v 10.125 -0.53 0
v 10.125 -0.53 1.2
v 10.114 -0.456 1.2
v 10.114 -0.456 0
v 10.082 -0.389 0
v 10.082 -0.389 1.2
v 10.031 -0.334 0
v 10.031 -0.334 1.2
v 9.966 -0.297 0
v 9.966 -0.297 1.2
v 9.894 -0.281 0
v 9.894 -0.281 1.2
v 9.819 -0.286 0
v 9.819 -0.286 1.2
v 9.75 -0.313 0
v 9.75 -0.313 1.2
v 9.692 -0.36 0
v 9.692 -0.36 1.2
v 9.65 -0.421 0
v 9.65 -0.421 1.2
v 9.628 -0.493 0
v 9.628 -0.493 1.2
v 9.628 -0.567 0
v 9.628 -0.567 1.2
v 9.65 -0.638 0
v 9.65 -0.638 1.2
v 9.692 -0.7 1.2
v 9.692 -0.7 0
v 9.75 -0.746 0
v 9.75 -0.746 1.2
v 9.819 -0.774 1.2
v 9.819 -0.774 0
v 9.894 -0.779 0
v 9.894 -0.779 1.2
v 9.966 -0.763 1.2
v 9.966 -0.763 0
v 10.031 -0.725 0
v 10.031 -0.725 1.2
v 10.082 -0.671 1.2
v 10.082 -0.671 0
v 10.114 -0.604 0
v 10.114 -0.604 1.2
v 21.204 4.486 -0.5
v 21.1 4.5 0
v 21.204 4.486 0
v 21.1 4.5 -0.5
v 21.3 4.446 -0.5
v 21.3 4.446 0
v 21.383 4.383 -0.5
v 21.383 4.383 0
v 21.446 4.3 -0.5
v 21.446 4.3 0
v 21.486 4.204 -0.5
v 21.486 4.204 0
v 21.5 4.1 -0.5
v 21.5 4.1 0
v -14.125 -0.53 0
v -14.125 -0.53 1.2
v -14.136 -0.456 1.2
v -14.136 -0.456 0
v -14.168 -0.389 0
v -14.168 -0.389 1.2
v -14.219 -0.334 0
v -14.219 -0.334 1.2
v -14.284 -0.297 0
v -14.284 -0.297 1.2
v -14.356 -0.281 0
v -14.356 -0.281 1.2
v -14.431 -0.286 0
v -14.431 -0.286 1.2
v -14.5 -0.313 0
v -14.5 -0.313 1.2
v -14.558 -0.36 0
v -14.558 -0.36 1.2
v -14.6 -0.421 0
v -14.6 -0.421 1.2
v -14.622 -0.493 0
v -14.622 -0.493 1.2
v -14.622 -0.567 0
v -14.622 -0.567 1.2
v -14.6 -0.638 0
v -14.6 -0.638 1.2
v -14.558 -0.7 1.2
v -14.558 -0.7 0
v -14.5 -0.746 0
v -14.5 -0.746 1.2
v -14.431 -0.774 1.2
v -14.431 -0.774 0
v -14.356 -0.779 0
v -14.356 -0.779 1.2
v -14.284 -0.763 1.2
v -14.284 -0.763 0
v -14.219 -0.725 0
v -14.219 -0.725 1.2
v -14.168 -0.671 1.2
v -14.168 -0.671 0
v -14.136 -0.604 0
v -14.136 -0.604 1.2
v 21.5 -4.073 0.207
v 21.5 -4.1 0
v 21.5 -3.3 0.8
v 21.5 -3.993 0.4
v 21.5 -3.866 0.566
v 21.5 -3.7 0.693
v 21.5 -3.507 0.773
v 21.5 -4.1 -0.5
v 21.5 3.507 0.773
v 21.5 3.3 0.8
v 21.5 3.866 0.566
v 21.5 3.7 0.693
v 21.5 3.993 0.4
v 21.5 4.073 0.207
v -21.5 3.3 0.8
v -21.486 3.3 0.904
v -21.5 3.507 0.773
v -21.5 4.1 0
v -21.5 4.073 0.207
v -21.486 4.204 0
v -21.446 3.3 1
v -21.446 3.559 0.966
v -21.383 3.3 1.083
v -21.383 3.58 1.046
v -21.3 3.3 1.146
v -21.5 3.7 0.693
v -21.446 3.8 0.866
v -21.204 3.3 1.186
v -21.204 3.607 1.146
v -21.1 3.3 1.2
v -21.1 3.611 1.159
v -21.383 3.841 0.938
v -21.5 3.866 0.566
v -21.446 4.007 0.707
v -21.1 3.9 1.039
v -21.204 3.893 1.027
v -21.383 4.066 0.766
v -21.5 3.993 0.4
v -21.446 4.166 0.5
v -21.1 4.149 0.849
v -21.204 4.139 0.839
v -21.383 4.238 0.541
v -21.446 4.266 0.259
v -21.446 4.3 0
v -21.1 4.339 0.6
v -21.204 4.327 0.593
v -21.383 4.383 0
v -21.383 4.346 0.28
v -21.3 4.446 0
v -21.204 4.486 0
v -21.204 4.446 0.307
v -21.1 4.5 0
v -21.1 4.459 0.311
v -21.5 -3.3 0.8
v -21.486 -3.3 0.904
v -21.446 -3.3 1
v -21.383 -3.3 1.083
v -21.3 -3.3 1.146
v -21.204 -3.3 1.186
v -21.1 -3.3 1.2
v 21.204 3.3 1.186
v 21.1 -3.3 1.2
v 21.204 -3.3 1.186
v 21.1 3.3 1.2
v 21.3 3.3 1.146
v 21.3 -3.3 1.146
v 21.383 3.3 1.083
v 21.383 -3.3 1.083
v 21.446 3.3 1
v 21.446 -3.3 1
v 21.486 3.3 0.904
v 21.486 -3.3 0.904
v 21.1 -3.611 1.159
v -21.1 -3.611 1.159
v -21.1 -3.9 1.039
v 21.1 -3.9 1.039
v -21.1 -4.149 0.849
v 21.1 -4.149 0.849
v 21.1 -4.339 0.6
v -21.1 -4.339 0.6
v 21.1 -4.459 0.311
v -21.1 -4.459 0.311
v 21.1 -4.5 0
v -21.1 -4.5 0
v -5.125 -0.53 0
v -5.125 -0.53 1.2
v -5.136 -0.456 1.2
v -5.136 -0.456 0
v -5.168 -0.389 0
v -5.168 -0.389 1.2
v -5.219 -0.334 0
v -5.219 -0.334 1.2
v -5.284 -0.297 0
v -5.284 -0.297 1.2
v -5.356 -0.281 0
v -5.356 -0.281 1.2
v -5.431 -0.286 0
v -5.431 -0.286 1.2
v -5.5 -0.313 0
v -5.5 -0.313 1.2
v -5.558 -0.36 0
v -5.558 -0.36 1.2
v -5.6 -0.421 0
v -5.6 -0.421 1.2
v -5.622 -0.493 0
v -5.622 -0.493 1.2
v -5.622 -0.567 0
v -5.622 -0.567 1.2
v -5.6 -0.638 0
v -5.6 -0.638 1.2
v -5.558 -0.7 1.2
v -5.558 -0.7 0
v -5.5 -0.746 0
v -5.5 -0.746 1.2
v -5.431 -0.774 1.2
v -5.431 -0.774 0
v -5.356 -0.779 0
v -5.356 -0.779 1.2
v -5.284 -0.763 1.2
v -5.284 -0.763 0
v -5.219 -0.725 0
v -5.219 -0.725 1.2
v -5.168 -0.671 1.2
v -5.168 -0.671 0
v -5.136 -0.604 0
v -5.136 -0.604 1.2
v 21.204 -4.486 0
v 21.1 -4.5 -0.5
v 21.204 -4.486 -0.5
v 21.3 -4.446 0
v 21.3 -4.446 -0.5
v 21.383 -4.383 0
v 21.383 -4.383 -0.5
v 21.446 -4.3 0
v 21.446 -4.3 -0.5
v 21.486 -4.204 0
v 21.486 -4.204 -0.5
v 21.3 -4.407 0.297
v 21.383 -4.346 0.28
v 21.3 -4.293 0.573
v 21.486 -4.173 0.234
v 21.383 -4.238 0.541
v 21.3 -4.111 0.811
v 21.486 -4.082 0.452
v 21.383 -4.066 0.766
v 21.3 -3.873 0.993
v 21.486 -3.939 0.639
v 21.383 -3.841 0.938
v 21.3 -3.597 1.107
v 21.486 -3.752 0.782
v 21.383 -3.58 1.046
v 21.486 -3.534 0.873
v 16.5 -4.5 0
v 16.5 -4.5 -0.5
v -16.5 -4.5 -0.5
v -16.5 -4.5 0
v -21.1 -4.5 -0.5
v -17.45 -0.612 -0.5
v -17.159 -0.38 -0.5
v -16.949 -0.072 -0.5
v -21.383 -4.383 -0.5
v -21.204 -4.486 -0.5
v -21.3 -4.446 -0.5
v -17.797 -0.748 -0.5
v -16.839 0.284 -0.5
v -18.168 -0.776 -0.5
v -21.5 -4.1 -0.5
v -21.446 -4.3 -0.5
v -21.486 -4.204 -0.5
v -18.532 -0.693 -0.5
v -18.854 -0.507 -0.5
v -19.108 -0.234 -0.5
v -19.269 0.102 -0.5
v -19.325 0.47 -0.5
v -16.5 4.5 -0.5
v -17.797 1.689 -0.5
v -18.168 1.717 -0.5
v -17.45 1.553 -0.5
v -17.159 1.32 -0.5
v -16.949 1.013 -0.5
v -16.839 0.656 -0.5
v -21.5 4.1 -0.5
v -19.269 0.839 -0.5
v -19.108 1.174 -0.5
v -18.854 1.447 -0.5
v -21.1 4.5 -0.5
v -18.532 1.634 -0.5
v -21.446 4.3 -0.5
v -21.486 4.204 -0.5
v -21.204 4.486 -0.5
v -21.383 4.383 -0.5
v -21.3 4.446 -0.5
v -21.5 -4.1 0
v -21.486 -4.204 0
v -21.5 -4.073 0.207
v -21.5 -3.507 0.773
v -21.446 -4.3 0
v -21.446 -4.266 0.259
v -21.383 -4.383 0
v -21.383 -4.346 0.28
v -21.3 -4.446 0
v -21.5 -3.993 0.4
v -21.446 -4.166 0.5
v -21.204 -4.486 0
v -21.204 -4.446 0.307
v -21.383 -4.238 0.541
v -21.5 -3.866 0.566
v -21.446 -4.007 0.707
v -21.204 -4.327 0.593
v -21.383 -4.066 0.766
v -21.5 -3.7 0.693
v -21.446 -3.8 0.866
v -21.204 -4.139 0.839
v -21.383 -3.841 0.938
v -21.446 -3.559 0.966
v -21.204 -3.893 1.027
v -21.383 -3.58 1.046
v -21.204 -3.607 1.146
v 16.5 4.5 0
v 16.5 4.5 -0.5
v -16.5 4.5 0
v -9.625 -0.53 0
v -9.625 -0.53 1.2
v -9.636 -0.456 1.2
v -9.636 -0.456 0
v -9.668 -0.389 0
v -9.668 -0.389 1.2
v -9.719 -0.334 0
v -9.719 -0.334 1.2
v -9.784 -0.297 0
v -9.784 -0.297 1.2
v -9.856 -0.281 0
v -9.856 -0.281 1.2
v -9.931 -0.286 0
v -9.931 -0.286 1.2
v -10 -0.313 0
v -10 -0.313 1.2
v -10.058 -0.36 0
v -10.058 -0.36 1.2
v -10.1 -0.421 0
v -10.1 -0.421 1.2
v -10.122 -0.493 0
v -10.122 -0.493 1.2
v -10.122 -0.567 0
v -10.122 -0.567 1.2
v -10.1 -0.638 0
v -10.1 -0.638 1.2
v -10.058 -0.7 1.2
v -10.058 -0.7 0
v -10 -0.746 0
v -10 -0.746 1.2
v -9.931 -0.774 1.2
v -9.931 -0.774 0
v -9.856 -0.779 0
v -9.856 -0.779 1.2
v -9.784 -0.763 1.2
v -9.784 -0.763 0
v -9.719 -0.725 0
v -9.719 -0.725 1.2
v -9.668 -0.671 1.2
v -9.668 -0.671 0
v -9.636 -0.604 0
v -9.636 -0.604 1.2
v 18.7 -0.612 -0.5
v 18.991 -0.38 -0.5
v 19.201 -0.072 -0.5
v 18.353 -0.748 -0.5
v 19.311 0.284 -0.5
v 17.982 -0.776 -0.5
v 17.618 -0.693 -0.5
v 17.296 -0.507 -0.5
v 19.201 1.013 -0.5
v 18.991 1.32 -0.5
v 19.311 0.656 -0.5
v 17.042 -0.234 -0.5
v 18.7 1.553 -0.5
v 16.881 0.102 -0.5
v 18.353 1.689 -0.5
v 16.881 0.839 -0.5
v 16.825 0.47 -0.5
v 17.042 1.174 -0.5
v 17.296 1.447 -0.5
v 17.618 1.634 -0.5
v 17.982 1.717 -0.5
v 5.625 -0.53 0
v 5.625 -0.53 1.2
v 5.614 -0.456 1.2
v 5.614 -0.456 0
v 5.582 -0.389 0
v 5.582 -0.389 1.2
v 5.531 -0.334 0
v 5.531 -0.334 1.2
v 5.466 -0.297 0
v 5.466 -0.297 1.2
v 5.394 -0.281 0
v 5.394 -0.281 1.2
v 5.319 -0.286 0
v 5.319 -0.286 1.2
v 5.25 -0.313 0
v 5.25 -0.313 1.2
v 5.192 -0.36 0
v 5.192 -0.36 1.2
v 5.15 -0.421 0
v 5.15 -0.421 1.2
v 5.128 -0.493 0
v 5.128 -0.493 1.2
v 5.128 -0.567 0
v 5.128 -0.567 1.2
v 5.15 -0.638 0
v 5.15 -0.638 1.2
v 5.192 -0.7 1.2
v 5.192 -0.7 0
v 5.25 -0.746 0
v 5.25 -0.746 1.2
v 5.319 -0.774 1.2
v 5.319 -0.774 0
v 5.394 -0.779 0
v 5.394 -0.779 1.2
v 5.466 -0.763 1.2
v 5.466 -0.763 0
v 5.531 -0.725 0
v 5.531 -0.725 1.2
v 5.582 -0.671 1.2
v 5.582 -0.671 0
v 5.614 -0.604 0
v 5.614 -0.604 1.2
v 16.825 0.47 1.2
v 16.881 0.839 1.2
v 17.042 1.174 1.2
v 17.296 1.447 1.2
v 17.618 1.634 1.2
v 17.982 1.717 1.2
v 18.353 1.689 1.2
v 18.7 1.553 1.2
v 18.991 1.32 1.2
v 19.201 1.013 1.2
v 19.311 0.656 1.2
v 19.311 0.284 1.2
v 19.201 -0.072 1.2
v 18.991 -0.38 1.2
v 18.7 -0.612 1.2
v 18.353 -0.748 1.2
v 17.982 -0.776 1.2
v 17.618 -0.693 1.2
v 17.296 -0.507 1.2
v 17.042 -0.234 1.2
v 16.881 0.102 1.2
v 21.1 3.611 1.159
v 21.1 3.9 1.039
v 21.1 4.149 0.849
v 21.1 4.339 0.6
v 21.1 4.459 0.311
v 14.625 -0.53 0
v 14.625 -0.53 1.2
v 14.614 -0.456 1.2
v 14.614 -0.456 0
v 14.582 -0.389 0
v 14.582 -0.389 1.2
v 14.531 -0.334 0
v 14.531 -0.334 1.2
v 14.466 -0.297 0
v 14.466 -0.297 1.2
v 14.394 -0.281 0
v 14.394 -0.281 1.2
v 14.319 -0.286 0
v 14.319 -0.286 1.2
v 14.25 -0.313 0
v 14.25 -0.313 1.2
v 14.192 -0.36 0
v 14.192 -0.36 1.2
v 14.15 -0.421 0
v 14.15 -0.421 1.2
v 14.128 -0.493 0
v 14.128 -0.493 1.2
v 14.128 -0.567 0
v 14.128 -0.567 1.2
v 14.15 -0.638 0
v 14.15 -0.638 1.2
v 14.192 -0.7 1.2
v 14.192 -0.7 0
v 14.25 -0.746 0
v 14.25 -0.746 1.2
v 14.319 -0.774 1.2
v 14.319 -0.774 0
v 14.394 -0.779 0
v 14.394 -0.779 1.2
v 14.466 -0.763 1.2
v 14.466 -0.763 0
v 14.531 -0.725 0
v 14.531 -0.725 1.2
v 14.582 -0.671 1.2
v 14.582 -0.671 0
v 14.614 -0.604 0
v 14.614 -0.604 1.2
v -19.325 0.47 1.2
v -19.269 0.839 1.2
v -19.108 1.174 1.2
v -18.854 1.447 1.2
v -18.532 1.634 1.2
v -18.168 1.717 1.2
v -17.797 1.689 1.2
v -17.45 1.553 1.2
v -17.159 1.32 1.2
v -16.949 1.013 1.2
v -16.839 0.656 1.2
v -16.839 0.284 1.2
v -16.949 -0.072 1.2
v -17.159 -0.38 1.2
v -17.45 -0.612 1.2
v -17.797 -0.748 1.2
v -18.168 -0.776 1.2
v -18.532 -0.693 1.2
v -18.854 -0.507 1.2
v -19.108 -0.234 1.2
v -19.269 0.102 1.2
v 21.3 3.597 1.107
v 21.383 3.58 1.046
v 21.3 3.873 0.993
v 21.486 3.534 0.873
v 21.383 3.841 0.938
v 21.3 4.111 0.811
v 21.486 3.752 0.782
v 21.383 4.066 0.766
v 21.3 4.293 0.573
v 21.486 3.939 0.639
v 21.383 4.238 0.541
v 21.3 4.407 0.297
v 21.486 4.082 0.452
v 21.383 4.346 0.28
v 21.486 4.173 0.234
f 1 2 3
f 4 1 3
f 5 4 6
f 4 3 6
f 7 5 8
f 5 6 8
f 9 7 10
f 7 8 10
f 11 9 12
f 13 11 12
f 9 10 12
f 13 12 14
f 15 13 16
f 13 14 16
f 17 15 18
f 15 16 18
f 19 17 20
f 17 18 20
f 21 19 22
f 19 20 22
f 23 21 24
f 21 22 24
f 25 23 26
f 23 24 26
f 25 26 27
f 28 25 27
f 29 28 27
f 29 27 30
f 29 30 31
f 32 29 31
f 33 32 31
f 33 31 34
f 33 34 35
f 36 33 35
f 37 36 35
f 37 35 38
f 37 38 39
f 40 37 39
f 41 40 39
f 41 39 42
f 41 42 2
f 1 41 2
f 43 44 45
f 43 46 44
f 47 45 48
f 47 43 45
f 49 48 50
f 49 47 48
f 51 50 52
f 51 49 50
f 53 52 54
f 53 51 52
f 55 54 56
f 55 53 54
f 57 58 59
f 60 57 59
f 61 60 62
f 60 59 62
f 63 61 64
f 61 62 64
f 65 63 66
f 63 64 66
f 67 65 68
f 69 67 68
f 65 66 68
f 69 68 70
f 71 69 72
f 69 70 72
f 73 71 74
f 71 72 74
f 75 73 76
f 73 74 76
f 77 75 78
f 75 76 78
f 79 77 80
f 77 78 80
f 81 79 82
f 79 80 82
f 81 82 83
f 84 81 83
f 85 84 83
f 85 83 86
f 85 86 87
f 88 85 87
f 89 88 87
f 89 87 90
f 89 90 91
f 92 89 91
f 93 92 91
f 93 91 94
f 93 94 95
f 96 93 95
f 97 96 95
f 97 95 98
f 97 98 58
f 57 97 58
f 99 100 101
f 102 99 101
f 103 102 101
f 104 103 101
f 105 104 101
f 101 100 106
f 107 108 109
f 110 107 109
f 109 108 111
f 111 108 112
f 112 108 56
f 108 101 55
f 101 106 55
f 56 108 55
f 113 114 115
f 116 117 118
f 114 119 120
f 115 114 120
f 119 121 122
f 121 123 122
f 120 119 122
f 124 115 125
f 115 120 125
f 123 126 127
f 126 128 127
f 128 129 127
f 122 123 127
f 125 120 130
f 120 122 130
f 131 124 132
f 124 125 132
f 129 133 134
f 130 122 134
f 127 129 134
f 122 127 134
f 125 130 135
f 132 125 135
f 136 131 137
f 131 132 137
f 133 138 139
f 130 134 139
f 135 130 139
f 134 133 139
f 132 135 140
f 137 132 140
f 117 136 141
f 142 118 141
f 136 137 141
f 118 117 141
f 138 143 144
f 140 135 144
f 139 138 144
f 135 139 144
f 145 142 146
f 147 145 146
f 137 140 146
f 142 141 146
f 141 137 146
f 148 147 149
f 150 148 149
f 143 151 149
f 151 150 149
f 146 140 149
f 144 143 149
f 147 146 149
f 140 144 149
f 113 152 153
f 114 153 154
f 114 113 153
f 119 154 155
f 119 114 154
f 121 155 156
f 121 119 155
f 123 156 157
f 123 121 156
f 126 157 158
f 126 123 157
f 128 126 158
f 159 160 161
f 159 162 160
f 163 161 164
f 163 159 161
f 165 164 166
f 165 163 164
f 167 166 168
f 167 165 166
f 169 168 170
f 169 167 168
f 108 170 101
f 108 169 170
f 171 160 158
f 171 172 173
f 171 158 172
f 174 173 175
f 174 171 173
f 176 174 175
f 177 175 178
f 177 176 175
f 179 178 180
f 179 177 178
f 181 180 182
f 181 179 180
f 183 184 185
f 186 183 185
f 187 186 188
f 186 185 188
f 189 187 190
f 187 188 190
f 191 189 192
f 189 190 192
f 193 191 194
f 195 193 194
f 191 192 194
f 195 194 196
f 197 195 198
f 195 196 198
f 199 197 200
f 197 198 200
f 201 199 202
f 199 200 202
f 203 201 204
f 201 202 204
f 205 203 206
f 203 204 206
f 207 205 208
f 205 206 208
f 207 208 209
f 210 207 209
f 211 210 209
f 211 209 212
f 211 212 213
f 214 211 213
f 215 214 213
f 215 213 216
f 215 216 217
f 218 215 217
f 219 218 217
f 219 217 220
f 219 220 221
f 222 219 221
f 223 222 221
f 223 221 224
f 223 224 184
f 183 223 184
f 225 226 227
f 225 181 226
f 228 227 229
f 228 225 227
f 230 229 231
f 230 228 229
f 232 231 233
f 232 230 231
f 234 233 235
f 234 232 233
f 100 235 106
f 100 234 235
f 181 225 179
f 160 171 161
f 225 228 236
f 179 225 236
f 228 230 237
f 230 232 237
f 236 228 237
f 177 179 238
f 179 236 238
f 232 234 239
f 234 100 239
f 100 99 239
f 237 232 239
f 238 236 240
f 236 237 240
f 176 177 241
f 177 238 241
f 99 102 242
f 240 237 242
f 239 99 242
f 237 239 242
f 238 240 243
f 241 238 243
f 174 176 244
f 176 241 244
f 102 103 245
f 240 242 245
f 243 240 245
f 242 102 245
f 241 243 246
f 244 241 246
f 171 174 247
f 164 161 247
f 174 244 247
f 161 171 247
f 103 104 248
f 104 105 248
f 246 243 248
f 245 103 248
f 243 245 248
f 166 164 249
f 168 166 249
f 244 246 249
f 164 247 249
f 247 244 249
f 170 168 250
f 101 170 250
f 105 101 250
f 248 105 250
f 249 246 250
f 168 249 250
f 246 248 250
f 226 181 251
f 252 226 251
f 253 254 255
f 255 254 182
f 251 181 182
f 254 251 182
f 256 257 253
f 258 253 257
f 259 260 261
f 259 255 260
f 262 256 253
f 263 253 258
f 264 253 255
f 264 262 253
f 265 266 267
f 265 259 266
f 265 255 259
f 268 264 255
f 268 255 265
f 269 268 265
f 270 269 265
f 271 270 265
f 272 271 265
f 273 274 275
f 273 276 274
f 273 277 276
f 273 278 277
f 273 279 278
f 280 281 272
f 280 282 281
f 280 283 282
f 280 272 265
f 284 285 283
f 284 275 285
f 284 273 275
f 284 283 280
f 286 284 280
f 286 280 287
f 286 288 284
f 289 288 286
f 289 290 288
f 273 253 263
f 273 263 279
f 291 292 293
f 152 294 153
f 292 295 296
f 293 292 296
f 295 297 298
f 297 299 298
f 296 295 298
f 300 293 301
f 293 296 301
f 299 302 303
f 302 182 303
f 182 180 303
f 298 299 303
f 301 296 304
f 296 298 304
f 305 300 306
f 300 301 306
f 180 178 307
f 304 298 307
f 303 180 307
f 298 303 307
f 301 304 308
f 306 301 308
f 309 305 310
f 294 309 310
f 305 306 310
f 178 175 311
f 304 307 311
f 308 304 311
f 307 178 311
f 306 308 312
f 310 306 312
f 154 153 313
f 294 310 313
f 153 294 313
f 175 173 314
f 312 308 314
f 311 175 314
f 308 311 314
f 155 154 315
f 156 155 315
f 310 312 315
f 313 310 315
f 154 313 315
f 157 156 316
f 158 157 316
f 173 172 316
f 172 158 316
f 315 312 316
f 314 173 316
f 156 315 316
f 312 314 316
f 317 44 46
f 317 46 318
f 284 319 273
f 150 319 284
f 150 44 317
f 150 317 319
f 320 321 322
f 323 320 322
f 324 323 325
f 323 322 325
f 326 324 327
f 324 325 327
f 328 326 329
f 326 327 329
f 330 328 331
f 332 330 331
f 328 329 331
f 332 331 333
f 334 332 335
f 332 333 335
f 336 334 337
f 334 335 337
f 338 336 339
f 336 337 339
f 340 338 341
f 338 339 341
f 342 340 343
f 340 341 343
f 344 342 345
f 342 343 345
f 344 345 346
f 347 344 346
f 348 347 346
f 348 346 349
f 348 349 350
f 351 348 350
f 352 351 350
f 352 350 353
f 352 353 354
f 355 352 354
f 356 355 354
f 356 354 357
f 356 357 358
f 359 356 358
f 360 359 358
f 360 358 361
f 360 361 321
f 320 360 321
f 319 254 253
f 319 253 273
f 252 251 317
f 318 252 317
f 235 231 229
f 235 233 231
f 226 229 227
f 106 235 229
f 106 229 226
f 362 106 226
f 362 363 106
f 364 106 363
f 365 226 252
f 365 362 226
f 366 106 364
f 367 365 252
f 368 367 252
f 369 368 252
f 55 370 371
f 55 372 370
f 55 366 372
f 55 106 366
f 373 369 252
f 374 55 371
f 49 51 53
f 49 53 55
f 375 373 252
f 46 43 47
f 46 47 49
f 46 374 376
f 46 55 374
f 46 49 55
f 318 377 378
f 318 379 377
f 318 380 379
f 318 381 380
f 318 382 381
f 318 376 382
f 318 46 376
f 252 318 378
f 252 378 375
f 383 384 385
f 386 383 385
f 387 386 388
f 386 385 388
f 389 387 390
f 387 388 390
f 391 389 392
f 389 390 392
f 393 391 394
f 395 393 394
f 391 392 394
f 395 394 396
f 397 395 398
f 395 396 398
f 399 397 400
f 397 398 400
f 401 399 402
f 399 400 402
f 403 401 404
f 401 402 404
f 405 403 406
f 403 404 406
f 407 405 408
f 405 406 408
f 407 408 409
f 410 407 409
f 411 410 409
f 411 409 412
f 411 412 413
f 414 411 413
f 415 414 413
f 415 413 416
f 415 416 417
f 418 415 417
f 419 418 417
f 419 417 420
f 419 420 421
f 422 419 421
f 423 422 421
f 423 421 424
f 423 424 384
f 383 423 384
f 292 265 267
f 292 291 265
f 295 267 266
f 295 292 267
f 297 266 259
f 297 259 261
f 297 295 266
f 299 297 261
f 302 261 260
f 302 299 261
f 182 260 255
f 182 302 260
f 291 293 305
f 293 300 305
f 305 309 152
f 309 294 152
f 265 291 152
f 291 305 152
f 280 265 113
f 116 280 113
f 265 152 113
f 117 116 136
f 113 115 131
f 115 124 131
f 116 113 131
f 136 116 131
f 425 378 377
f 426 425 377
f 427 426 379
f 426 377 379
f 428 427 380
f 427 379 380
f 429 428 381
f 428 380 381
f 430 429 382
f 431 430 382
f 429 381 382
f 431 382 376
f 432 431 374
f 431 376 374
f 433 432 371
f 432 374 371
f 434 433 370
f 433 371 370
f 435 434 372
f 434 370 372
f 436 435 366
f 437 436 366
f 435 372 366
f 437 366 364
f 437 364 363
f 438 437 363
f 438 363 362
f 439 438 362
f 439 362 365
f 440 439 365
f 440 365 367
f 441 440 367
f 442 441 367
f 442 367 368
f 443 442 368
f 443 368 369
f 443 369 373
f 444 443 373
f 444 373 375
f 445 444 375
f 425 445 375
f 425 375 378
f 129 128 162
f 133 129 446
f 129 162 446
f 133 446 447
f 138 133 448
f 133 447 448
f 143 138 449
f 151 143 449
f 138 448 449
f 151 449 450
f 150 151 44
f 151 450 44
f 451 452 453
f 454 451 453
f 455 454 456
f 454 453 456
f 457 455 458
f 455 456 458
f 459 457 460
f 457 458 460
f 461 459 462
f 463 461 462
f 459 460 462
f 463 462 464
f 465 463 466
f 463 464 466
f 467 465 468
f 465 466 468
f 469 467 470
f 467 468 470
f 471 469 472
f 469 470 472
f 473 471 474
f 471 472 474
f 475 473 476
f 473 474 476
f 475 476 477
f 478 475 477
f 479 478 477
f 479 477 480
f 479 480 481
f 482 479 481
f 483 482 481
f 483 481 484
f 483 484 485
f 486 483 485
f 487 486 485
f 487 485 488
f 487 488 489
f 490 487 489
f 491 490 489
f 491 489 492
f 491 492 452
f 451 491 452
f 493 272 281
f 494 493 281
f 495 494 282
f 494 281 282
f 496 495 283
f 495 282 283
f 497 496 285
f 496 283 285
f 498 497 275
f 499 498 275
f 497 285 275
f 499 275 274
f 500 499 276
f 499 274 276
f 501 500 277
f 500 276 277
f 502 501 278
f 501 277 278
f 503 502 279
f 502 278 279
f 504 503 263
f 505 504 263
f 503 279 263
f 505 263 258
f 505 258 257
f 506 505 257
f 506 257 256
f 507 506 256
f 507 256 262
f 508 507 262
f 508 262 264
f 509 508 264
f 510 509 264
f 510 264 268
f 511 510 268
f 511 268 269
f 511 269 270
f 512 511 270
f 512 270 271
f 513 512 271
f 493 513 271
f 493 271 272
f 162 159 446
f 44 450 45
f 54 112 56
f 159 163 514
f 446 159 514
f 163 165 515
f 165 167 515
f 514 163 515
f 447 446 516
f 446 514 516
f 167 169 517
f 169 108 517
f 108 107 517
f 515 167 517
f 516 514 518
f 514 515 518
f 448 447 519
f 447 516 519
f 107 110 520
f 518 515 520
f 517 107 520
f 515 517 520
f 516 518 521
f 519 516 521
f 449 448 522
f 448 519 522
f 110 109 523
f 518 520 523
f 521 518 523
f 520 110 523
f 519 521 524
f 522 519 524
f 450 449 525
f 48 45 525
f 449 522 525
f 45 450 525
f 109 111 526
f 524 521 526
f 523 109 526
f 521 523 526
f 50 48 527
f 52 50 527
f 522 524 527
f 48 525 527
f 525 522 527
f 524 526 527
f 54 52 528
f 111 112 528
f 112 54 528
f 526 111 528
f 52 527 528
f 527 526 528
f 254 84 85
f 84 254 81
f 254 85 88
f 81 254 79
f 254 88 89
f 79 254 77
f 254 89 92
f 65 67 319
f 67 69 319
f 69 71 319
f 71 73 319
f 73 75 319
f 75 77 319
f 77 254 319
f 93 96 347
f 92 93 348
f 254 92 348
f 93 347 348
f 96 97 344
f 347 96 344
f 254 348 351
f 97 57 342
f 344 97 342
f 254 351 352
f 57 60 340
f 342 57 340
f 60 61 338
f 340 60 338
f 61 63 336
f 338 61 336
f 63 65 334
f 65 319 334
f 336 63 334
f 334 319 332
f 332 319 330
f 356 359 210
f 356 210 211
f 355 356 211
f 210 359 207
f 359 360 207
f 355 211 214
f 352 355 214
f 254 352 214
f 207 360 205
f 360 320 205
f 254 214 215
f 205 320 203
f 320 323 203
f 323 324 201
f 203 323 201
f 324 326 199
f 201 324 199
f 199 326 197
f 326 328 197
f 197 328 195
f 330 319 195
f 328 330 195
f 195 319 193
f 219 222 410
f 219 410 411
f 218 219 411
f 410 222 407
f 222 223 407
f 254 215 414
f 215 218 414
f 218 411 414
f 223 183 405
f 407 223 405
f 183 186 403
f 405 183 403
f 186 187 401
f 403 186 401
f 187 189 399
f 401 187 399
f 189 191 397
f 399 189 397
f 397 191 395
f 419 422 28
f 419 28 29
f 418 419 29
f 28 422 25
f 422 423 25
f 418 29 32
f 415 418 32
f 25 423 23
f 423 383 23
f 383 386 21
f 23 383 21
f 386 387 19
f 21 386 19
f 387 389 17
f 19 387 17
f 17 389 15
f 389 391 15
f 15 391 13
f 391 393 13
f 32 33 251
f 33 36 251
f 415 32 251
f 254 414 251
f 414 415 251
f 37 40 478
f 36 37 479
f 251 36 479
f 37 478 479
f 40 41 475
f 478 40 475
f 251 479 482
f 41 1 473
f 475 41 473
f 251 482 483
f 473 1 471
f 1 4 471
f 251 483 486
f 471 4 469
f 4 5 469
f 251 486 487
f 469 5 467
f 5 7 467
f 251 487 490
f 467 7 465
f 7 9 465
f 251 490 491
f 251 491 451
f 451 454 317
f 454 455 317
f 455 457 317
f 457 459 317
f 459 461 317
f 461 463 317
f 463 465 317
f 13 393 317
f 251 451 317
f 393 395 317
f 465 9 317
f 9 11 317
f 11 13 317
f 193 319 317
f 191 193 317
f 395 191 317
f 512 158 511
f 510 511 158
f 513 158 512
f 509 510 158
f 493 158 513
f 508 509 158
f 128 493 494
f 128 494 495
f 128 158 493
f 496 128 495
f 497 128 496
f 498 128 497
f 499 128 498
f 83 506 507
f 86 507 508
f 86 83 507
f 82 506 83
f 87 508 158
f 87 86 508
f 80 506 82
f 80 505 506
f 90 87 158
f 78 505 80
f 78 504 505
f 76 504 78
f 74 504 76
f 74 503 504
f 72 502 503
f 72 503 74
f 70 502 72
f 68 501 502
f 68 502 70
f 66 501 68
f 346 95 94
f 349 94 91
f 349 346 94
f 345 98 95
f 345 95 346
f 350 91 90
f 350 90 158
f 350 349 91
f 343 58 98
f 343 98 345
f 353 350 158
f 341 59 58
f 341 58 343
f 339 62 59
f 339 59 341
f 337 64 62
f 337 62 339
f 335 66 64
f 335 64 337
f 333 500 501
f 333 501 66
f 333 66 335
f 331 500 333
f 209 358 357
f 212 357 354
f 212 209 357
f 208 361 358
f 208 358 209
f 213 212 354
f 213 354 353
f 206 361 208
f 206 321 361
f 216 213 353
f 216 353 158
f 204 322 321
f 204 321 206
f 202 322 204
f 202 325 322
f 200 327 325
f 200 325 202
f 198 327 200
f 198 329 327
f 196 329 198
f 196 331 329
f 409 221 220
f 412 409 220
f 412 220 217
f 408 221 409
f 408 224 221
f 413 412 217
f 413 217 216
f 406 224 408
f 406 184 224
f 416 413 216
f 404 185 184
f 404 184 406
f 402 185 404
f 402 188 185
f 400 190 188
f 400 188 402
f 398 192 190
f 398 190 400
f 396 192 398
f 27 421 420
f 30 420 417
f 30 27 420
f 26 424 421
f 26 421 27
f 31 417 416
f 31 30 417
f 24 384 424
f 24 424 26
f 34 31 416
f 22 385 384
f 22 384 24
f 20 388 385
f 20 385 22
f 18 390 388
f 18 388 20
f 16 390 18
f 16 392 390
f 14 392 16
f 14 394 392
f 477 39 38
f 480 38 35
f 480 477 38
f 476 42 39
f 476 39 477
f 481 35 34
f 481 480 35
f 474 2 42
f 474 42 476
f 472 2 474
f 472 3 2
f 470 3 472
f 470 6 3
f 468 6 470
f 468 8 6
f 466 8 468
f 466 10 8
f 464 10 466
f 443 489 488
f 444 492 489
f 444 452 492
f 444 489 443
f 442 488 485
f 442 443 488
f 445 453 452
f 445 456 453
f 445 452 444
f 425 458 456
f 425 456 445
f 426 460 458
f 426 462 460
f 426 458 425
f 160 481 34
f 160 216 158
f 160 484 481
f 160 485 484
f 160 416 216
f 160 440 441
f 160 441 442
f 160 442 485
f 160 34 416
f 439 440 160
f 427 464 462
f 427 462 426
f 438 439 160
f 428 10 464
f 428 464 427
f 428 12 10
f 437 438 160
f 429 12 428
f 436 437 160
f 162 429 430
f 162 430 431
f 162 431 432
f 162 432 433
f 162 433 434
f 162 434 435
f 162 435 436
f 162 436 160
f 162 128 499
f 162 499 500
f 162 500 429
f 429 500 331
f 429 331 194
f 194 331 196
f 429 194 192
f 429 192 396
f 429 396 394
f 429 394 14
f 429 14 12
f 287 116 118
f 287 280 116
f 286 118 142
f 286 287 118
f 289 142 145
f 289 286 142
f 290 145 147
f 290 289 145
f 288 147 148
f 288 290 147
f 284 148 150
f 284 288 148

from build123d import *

# Parameters (mm, degrees)
ESBO_O1_W                = 43
ESBO_O1_H                = 9
RESSALTO_EXTRUS_O1_DEPTH = 1.2
ESBO_O4_W                = 5
ESBO_O4_H                = 9
RESSALTO_EXTRUS_O4_DEPTH = 0.5
FILETE1_R                = 1.2
FILETE2_R                = 1.2
ESBO_O6_R                = 1.25
CORTE_EXTRUS_O2_DEPTH    = 5.5
FILETE3_R                = 0.4
FILETE4_R                = 0.4
ESBO_O7_R                = 0.25
CORTE_EXTRUS_O3_DEPTH    = 23.031568281


with BuildPart() as part:
    # Esboço1 → Ressalto-extrusão1 (new body)
    with BuildSketch(Plane.XY):
        Rectangle(ESBO_O1_W, ESBO_O1_H)
    extrude(amount=RESSALTO_EXTRUS_O1_DEPTH)

    # Esboço4 → Ressalto-extrusão4 (add)
    with BuildSketch(Plane(origin=(0, 0, 0), x_dir=(-1, 0, 0), z_dir=(0, 0, -1))):
        with Locations((19, 0)):
            Rectangle(ESBO_O4_W, ESBO_O4_H)
        with Locations((-19, 0)):
            Rectangle(ESBO_O4_W, ESBO_O4_H)
    extrude(amount=RESSALTO_EXTRUS_O4_DEPTH)

    # Filete1
    filete1_edges = [part.edges().sort_by_distance(p)[0] for p in [
        (0, 4.5, 1.2),
    ]]
    fillet(filete1_edges, radius=FILETE1_R - 0.0001)  # a hair under: the kernel refuses the full size

    # Filete2
    filete2_edges = [part.edges().sort_by_distance(p)[0] for p in [
        (0, -4.5, 1.2),
    ]]
    fillet(filete2_edges, radius=FILETE2_R - 0.0001)  # a hair under: the kernel refuses the full size

    # Esboço6 → Corte-extrusão2 (cut)
    with BuildSketch(Plane(origin=(0, 0, -0.5), x_dir=(-1, 0, 0), z_dir=(0, 0, -1))):
        with Locations((-18.075, 0.470186795)):
            Circle(ESBO_O6_R)
        with Locations((18.075, 0.470186795)):
            Circle(ESBO_O6_R)
    extrude(amount=-CORTE_EXTRUS_O2_DEPTH, mode=Mode.SUBTRACT)

    # Filete3
    filete3_edges = [part.edges().sort_by_distance(p)[0] for p in [
        (-21.5, 0, 1.2),
        (-21.5, 4.5, -0.24995),
        (-21.5, 4.148557427, 0.848557427),
        (-21.5, -4.5, -0.24995),
        (-21.5, -4.148557427, 0.848557427),
    ]]
    fillet(filete3_edges, radius=FILETE3_R)

    # Filete4
    filete4_edges = [part.edges().sort_by_distance(p)[0] for p in [
        (21.5, 4.5, -0.24995),
        (21.5, 4.148557427, 0.848557427),
        (21.5, 0, 1.2),
        (21.5, -4.5, -0.24995),
        (21.5, -4.148557427, 0.848557427),
    ]]
    fillet(filete4_edges, radius=FILETE4_R)

    # Esboço7 → Corte-extrusão3 (cut, through all)
    with BuildSketch(Plane.XY.offset(1.2)):
        with Locations((14.375, -0.529813205)):
            Circle(ESBO_O7_R)
        with Locations((-14.375, -0.529813205)):
            Circle(ESBO_O7_R)
        with Locations((-9.875, -0.529813205)):
            Circle(ESBO_O7_R)
        with Locations((-5.375, -0.529813205)):
            Circle(ESBO_O7_R)
        with Locations((9.875, -0.529813205)):
            Circle(ESBO_O7_R)
        with Locations((5.375, -0.529813205)):
            Circle(ESBO_O7_R)
    extrude(amount=-CORTE_EXTRUS_O3_DEPTH, mode=Mode.SUBTRACT)


solid = part.part
